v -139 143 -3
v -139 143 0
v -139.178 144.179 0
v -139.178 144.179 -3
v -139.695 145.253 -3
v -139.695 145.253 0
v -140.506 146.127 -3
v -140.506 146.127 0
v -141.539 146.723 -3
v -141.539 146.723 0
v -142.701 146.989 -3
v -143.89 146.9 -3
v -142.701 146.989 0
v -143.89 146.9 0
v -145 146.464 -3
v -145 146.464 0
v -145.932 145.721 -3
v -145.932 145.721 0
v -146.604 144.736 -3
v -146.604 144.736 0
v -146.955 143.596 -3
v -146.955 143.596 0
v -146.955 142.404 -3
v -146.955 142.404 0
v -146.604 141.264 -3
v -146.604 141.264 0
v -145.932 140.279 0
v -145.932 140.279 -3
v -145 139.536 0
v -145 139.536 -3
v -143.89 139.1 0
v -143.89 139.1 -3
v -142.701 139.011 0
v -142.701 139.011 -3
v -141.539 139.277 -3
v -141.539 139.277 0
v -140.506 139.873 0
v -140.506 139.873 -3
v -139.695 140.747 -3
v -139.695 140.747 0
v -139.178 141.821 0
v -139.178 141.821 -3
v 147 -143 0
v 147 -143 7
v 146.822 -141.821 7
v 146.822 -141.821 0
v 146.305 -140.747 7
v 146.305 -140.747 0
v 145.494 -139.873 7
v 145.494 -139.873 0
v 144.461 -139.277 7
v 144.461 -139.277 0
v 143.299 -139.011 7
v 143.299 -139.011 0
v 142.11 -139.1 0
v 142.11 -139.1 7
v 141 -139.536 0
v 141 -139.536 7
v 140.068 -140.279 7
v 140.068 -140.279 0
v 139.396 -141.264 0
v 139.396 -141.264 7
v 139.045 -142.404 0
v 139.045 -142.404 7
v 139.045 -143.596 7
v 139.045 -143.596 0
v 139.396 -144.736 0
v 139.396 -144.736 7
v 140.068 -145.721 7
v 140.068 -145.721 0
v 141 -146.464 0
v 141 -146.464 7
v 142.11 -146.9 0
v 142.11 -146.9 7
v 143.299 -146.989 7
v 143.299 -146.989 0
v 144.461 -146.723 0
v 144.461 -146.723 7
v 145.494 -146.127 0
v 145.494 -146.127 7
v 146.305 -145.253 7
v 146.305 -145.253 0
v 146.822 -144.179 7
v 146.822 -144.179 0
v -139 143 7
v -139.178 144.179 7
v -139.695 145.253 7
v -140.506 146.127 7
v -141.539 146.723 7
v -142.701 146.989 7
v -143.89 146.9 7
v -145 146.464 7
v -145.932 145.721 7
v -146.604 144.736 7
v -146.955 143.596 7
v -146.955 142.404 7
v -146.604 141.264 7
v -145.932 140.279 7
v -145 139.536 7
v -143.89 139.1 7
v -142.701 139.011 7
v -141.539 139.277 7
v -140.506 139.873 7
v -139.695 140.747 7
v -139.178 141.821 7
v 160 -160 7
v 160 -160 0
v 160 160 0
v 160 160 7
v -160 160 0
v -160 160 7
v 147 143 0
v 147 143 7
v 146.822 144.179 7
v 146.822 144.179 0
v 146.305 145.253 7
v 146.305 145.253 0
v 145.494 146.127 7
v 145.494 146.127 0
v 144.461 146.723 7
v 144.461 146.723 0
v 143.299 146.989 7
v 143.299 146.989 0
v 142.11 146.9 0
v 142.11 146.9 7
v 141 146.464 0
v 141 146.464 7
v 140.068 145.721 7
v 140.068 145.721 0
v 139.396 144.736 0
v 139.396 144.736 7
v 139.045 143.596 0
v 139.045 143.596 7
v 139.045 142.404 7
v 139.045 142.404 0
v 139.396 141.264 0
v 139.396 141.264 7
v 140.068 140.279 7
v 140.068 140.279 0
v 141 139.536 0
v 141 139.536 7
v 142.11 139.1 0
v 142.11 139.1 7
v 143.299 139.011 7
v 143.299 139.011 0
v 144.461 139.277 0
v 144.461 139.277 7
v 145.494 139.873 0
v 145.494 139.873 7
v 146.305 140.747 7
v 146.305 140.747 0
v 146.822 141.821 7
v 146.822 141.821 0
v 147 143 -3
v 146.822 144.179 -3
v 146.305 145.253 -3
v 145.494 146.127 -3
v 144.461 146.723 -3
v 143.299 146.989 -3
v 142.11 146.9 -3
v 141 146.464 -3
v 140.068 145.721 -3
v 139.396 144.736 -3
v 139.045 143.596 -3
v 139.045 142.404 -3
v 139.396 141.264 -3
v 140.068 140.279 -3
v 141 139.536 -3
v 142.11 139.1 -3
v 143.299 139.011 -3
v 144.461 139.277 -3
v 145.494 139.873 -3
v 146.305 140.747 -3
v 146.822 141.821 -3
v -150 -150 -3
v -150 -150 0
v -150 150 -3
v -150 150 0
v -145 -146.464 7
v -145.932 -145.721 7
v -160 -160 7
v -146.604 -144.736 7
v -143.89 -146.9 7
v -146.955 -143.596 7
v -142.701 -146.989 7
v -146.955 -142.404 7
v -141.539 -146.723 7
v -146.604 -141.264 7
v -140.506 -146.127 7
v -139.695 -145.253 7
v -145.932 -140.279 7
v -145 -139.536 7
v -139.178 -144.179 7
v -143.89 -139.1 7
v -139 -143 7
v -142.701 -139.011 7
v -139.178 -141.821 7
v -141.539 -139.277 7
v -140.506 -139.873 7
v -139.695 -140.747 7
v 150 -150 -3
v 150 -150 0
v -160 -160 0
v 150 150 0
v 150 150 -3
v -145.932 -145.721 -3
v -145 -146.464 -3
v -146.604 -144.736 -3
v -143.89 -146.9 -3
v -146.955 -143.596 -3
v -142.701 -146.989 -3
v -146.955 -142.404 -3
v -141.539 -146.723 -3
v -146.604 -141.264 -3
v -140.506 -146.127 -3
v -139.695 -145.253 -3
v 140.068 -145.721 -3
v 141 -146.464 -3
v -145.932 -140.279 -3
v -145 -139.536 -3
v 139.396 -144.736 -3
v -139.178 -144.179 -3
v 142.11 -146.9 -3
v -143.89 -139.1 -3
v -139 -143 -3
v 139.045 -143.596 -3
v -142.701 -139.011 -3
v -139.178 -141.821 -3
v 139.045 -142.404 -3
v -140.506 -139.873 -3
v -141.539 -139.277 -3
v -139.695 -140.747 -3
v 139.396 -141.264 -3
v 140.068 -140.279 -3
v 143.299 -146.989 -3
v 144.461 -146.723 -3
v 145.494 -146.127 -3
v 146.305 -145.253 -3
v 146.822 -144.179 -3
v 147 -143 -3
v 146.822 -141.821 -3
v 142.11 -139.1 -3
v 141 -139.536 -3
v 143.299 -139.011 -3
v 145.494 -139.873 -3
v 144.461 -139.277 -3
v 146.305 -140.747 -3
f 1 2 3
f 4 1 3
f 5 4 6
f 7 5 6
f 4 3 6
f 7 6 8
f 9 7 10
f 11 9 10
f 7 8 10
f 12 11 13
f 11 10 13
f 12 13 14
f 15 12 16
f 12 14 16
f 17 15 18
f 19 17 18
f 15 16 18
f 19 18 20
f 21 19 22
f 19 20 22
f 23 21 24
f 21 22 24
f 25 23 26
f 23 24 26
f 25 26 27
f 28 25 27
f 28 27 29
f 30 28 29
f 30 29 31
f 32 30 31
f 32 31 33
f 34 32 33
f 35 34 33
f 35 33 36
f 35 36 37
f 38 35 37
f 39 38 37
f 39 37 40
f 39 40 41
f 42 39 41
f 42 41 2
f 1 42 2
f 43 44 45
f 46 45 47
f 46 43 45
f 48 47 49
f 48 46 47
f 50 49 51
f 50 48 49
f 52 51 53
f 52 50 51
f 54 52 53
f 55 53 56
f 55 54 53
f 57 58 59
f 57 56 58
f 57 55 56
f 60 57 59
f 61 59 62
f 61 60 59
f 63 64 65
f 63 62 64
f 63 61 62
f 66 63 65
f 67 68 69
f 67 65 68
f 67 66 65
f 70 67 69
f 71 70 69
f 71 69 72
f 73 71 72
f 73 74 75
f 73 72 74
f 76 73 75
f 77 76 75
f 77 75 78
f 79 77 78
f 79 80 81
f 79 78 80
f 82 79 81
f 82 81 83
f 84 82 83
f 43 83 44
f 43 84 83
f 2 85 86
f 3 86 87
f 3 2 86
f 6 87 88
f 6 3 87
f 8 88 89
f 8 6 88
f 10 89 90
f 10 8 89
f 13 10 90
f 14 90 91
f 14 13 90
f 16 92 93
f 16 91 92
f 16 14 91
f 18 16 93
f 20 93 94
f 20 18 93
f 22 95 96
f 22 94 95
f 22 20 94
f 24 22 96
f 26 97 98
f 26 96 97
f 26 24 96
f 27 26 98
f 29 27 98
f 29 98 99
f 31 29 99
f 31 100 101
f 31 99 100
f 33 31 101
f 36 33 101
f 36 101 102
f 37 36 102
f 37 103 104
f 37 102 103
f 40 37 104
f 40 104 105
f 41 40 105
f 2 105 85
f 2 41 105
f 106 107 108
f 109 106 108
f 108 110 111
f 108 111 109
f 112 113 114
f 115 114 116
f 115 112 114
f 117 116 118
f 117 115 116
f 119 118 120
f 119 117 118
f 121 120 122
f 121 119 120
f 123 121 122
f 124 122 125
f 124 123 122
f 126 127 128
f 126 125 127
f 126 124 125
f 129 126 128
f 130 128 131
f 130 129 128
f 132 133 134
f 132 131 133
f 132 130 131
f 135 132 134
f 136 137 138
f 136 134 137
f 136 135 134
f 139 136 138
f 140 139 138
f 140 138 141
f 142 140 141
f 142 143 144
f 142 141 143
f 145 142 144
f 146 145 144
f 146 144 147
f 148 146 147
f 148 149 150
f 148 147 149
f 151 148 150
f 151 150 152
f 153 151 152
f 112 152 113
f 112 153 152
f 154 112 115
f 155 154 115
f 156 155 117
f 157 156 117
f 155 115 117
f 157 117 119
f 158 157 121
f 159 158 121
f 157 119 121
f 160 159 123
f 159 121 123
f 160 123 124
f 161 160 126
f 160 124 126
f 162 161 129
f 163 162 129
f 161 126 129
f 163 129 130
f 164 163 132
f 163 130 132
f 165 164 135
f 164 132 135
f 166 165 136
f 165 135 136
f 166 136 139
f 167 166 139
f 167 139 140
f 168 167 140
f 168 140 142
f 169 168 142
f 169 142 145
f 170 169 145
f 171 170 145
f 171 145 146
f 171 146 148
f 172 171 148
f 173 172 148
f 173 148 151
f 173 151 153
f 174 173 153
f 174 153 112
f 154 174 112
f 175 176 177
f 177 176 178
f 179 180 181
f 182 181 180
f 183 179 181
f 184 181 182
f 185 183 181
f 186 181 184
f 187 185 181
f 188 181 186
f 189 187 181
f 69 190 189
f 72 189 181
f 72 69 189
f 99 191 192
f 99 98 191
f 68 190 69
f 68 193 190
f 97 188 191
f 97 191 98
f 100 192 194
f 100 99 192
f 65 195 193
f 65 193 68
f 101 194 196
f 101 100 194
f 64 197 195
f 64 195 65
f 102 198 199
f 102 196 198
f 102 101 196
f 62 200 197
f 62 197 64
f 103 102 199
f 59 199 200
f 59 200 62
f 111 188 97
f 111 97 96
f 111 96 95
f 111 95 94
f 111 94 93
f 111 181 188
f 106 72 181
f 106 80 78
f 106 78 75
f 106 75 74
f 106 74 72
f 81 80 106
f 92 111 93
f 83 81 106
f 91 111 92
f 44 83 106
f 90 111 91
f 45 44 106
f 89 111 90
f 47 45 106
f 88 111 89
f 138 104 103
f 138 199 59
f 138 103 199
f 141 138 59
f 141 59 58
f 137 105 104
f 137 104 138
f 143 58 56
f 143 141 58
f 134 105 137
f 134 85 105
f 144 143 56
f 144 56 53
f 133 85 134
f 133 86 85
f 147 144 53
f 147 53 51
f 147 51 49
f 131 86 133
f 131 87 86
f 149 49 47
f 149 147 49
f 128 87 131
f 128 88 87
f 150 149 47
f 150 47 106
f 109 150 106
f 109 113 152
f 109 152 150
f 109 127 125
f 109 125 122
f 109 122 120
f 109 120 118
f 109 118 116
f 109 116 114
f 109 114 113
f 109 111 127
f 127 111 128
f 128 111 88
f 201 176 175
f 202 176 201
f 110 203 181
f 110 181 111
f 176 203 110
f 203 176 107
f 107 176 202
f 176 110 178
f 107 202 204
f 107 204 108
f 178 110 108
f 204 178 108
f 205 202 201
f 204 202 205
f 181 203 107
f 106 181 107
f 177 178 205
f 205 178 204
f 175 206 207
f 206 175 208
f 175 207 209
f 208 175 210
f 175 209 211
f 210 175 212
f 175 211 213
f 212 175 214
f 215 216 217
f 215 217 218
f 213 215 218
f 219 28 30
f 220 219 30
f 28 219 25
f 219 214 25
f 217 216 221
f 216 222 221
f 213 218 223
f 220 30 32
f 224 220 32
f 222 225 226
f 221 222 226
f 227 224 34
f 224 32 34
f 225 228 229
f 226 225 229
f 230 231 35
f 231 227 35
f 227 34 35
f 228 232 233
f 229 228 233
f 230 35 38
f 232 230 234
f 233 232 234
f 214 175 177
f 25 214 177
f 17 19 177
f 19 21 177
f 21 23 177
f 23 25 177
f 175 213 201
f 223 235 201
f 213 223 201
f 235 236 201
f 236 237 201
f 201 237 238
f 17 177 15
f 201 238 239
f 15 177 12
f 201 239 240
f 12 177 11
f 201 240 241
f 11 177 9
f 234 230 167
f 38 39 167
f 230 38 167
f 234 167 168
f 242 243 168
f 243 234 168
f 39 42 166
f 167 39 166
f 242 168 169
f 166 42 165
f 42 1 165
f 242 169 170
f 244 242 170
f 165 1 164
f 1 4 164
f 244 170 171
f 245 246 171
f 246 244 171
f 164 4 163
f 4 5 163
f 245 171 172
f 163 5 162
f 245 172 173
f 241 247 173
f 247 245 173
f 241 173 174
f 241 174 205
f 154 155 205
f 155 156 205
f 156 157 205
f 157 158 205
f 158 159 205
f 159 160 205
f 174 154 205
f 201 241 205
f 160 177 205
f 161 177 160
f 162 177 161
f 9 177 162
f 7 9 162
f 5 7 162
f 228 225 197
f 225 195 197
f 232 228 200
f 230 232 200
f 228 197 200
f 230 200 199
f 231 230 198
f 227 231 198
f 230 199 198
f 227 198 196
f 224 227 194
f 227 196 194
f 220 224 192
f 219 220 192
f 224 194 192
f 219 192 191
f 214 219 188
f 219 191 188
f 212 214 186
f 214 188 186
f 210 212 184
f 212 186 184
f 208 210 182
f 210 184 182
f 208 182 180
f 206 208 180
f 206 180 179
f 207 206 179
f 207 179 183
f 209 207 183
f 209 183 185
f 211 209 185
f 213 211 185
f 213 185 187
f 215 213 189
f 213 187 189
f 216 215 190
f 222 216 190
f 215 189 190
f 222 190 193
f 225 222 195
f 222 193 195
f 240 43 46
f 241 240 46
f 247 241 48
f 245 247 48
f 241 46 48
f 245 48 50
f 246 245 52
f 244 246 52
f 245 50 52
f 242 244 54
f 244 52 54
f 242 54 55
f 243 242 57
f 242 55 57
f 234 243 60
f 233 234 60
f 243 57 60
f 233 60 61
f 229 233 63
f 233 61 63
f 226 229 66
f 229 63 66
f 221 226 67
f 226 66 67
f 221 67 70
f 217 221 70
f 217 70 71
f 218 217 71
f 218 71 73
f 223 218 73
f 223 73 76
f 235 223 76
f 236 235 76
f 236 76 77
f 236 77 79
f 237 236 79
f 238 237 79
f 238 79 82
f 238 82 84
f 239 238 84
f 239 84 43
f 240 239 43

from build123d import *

# Parameters (mm, degrees)
F0_W     = 320
F0_H     = 320
F0_W_2   = 300
F0_H_2   = 300
F1_DEPTH = 7
F2_DEPTH = 3
F3_R     = 4
F4_DEPTH = 7.5


with BuildPart() as f1:
    # F0 (on Top) → F1 (new body)
    with BuildSketch(Plane.XY):
        Rectangle(F0_W, F0_H)
        Rectangle(F0_W_2, F0_H_2, mode=Mode.SUBTRACT)
        Rectangle(F0_W_2, F0_H_2)
    extrude(amount=F1_DEPTH)

    # F0 (on Top) → F2 (join)
    with BuildSketch(Plane.XY):
        Rectangle(F0_W_2, F0_H_2)
    extrude(amount=-F2_DEPTH)

    # F3 (on Top) → F4 (cut, symmetric)
    with BuildSketch(Plane.XY):
        with Locations((-143, 143)):
            Circle(F3_R)
        with Locations((143, 143)):
            Circle(F3_R)
        with Locations((143, -143)):
            Circle(F3_R)
        with Locations((-143, -143)):
            Circle(F3_R)
    extrude(amount=F4_DEPTH, both=True, mode=Mode.SUBTRACT)


solid = f1.part
